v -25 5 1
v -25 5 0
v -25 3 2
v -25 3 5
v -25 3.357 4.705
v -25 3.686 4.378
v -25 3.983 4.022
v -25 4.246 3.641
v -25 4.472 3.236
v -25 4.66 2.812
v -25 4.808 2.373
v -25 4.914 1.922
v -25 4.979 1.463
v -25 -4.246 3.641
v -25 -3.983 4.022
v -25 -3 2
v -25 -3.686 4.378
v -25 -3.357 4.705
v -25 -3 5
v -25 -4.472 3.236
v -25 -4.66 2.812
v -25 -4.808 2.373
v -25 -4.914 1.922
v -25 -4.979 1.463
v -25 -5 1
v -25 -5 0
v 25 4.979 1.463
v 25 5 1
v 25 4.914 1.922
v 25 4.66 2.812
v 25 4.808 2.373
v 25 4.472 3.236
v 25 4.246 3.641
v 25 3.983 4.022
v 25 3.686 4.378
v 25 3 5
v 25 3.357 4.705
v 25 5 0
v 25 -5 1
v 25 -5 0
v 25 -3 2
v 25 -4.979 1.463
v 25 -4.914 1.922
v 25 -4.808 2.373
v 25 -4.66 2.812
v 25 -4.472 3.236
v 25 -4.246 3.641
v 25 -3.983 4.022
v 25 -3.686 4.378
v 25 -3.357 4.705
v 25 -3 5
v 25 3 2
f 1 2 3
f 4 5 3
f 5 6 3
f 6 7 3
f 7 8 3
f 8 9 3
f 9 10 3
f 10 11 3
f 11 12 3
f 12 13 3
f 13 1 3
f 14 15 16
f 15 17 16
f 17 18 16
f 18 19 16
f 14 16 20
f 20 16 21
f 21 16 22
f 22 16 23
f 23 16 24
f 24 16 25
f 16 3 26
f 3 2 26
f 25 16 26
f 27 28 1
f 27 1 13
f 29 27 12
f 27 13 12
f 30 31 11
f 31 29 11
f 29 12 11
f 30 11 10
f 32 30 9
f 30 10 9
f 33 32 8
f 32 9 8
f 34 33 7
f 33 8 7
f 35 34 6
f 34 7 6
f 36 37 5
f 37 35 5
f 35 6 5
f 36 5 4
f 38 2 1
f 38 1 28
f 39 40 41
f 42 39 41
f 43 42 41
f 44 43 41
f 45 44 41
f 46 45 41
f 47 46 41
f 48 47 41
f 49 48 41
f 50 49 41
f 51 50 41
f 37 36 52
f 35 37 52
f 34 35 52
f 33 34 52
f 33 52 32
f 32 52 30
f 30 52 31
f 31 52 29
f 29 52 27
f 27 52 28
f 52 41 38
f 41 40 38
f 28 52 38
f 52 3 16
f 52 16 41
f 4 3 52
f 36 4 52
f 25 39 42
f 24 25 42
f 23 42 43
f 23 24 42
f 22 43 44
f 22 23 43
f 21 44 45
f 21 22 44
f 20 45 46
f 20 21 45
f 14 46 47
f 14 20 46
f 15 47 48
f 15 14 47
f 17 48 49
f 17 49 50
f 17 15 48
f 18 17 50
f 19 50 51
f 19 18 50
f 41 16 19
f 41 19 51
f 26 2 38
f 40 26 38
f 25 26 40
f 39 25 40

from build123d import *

# Parameters (mm, degrees)
F0_W        = 50
F0_H        = 6
F0_H_2      = 2
F1_DEPTH    = 2
F2_DEPTH    = 5
F3_T1_DEPTH = 70


# Not quite as in the source:
# - a fillet or chamfer that OpenCascade refuses, or shapes differently, is made with other operations: its cross-section is extruded or revolved along the edge and cut away or added
# - a feature names something its author has since deleted; it is built from what else it names


with BuildPart() as f1:
    # F0 (on Top) → F1 (new body)
    with BuildSketch(Plane.XY):
        Rectangle(F0_W, F0_H)
        with Locations((0, 4)):
            Rectangle(F0_W, F0_H_2)
        with Locations((0, -4)):
            Rectangle(F0_W, F0_H_2)
    extrude(amount=F1_DEPTH)

    # F0 (on Top) → F2 (join)
    with BuildSketch(Plane.XY):
        with Locations((0, 4)):
            Rectangle(F0_W, F0_H_2)
        with Locations((0, -4)):
            Rectangle(F0_W, F0_H_2)
    extrude(amount=F2_DEPTH)

    # F3: fillet of radius 5 on 2 edges, made by hand

    # F3_s2 → F3_t1 (cut)
    with BuildSketch(Plane.YZ.offset(-35)):
        with BuildLine():
            ThreePointArc((-5, 1), (-4.472135955, 3.2360679775), (-3, 5))
            Line((-3, 5), (-5, 5))
            Line((-5, 5), (-5, 1))
        make_face()
        with BuildLine():
            ThreePointArc((5, 1), (4.472135955, 3.2360679775), (3, 5))
            Line((3, 5), (5, 5))
            Line((5, 5), (5, 1))
        make_face()
    extrude(amount=F3_T1_DEPTH, mode=Mode.SUBTRACT)


solid = f1.part
